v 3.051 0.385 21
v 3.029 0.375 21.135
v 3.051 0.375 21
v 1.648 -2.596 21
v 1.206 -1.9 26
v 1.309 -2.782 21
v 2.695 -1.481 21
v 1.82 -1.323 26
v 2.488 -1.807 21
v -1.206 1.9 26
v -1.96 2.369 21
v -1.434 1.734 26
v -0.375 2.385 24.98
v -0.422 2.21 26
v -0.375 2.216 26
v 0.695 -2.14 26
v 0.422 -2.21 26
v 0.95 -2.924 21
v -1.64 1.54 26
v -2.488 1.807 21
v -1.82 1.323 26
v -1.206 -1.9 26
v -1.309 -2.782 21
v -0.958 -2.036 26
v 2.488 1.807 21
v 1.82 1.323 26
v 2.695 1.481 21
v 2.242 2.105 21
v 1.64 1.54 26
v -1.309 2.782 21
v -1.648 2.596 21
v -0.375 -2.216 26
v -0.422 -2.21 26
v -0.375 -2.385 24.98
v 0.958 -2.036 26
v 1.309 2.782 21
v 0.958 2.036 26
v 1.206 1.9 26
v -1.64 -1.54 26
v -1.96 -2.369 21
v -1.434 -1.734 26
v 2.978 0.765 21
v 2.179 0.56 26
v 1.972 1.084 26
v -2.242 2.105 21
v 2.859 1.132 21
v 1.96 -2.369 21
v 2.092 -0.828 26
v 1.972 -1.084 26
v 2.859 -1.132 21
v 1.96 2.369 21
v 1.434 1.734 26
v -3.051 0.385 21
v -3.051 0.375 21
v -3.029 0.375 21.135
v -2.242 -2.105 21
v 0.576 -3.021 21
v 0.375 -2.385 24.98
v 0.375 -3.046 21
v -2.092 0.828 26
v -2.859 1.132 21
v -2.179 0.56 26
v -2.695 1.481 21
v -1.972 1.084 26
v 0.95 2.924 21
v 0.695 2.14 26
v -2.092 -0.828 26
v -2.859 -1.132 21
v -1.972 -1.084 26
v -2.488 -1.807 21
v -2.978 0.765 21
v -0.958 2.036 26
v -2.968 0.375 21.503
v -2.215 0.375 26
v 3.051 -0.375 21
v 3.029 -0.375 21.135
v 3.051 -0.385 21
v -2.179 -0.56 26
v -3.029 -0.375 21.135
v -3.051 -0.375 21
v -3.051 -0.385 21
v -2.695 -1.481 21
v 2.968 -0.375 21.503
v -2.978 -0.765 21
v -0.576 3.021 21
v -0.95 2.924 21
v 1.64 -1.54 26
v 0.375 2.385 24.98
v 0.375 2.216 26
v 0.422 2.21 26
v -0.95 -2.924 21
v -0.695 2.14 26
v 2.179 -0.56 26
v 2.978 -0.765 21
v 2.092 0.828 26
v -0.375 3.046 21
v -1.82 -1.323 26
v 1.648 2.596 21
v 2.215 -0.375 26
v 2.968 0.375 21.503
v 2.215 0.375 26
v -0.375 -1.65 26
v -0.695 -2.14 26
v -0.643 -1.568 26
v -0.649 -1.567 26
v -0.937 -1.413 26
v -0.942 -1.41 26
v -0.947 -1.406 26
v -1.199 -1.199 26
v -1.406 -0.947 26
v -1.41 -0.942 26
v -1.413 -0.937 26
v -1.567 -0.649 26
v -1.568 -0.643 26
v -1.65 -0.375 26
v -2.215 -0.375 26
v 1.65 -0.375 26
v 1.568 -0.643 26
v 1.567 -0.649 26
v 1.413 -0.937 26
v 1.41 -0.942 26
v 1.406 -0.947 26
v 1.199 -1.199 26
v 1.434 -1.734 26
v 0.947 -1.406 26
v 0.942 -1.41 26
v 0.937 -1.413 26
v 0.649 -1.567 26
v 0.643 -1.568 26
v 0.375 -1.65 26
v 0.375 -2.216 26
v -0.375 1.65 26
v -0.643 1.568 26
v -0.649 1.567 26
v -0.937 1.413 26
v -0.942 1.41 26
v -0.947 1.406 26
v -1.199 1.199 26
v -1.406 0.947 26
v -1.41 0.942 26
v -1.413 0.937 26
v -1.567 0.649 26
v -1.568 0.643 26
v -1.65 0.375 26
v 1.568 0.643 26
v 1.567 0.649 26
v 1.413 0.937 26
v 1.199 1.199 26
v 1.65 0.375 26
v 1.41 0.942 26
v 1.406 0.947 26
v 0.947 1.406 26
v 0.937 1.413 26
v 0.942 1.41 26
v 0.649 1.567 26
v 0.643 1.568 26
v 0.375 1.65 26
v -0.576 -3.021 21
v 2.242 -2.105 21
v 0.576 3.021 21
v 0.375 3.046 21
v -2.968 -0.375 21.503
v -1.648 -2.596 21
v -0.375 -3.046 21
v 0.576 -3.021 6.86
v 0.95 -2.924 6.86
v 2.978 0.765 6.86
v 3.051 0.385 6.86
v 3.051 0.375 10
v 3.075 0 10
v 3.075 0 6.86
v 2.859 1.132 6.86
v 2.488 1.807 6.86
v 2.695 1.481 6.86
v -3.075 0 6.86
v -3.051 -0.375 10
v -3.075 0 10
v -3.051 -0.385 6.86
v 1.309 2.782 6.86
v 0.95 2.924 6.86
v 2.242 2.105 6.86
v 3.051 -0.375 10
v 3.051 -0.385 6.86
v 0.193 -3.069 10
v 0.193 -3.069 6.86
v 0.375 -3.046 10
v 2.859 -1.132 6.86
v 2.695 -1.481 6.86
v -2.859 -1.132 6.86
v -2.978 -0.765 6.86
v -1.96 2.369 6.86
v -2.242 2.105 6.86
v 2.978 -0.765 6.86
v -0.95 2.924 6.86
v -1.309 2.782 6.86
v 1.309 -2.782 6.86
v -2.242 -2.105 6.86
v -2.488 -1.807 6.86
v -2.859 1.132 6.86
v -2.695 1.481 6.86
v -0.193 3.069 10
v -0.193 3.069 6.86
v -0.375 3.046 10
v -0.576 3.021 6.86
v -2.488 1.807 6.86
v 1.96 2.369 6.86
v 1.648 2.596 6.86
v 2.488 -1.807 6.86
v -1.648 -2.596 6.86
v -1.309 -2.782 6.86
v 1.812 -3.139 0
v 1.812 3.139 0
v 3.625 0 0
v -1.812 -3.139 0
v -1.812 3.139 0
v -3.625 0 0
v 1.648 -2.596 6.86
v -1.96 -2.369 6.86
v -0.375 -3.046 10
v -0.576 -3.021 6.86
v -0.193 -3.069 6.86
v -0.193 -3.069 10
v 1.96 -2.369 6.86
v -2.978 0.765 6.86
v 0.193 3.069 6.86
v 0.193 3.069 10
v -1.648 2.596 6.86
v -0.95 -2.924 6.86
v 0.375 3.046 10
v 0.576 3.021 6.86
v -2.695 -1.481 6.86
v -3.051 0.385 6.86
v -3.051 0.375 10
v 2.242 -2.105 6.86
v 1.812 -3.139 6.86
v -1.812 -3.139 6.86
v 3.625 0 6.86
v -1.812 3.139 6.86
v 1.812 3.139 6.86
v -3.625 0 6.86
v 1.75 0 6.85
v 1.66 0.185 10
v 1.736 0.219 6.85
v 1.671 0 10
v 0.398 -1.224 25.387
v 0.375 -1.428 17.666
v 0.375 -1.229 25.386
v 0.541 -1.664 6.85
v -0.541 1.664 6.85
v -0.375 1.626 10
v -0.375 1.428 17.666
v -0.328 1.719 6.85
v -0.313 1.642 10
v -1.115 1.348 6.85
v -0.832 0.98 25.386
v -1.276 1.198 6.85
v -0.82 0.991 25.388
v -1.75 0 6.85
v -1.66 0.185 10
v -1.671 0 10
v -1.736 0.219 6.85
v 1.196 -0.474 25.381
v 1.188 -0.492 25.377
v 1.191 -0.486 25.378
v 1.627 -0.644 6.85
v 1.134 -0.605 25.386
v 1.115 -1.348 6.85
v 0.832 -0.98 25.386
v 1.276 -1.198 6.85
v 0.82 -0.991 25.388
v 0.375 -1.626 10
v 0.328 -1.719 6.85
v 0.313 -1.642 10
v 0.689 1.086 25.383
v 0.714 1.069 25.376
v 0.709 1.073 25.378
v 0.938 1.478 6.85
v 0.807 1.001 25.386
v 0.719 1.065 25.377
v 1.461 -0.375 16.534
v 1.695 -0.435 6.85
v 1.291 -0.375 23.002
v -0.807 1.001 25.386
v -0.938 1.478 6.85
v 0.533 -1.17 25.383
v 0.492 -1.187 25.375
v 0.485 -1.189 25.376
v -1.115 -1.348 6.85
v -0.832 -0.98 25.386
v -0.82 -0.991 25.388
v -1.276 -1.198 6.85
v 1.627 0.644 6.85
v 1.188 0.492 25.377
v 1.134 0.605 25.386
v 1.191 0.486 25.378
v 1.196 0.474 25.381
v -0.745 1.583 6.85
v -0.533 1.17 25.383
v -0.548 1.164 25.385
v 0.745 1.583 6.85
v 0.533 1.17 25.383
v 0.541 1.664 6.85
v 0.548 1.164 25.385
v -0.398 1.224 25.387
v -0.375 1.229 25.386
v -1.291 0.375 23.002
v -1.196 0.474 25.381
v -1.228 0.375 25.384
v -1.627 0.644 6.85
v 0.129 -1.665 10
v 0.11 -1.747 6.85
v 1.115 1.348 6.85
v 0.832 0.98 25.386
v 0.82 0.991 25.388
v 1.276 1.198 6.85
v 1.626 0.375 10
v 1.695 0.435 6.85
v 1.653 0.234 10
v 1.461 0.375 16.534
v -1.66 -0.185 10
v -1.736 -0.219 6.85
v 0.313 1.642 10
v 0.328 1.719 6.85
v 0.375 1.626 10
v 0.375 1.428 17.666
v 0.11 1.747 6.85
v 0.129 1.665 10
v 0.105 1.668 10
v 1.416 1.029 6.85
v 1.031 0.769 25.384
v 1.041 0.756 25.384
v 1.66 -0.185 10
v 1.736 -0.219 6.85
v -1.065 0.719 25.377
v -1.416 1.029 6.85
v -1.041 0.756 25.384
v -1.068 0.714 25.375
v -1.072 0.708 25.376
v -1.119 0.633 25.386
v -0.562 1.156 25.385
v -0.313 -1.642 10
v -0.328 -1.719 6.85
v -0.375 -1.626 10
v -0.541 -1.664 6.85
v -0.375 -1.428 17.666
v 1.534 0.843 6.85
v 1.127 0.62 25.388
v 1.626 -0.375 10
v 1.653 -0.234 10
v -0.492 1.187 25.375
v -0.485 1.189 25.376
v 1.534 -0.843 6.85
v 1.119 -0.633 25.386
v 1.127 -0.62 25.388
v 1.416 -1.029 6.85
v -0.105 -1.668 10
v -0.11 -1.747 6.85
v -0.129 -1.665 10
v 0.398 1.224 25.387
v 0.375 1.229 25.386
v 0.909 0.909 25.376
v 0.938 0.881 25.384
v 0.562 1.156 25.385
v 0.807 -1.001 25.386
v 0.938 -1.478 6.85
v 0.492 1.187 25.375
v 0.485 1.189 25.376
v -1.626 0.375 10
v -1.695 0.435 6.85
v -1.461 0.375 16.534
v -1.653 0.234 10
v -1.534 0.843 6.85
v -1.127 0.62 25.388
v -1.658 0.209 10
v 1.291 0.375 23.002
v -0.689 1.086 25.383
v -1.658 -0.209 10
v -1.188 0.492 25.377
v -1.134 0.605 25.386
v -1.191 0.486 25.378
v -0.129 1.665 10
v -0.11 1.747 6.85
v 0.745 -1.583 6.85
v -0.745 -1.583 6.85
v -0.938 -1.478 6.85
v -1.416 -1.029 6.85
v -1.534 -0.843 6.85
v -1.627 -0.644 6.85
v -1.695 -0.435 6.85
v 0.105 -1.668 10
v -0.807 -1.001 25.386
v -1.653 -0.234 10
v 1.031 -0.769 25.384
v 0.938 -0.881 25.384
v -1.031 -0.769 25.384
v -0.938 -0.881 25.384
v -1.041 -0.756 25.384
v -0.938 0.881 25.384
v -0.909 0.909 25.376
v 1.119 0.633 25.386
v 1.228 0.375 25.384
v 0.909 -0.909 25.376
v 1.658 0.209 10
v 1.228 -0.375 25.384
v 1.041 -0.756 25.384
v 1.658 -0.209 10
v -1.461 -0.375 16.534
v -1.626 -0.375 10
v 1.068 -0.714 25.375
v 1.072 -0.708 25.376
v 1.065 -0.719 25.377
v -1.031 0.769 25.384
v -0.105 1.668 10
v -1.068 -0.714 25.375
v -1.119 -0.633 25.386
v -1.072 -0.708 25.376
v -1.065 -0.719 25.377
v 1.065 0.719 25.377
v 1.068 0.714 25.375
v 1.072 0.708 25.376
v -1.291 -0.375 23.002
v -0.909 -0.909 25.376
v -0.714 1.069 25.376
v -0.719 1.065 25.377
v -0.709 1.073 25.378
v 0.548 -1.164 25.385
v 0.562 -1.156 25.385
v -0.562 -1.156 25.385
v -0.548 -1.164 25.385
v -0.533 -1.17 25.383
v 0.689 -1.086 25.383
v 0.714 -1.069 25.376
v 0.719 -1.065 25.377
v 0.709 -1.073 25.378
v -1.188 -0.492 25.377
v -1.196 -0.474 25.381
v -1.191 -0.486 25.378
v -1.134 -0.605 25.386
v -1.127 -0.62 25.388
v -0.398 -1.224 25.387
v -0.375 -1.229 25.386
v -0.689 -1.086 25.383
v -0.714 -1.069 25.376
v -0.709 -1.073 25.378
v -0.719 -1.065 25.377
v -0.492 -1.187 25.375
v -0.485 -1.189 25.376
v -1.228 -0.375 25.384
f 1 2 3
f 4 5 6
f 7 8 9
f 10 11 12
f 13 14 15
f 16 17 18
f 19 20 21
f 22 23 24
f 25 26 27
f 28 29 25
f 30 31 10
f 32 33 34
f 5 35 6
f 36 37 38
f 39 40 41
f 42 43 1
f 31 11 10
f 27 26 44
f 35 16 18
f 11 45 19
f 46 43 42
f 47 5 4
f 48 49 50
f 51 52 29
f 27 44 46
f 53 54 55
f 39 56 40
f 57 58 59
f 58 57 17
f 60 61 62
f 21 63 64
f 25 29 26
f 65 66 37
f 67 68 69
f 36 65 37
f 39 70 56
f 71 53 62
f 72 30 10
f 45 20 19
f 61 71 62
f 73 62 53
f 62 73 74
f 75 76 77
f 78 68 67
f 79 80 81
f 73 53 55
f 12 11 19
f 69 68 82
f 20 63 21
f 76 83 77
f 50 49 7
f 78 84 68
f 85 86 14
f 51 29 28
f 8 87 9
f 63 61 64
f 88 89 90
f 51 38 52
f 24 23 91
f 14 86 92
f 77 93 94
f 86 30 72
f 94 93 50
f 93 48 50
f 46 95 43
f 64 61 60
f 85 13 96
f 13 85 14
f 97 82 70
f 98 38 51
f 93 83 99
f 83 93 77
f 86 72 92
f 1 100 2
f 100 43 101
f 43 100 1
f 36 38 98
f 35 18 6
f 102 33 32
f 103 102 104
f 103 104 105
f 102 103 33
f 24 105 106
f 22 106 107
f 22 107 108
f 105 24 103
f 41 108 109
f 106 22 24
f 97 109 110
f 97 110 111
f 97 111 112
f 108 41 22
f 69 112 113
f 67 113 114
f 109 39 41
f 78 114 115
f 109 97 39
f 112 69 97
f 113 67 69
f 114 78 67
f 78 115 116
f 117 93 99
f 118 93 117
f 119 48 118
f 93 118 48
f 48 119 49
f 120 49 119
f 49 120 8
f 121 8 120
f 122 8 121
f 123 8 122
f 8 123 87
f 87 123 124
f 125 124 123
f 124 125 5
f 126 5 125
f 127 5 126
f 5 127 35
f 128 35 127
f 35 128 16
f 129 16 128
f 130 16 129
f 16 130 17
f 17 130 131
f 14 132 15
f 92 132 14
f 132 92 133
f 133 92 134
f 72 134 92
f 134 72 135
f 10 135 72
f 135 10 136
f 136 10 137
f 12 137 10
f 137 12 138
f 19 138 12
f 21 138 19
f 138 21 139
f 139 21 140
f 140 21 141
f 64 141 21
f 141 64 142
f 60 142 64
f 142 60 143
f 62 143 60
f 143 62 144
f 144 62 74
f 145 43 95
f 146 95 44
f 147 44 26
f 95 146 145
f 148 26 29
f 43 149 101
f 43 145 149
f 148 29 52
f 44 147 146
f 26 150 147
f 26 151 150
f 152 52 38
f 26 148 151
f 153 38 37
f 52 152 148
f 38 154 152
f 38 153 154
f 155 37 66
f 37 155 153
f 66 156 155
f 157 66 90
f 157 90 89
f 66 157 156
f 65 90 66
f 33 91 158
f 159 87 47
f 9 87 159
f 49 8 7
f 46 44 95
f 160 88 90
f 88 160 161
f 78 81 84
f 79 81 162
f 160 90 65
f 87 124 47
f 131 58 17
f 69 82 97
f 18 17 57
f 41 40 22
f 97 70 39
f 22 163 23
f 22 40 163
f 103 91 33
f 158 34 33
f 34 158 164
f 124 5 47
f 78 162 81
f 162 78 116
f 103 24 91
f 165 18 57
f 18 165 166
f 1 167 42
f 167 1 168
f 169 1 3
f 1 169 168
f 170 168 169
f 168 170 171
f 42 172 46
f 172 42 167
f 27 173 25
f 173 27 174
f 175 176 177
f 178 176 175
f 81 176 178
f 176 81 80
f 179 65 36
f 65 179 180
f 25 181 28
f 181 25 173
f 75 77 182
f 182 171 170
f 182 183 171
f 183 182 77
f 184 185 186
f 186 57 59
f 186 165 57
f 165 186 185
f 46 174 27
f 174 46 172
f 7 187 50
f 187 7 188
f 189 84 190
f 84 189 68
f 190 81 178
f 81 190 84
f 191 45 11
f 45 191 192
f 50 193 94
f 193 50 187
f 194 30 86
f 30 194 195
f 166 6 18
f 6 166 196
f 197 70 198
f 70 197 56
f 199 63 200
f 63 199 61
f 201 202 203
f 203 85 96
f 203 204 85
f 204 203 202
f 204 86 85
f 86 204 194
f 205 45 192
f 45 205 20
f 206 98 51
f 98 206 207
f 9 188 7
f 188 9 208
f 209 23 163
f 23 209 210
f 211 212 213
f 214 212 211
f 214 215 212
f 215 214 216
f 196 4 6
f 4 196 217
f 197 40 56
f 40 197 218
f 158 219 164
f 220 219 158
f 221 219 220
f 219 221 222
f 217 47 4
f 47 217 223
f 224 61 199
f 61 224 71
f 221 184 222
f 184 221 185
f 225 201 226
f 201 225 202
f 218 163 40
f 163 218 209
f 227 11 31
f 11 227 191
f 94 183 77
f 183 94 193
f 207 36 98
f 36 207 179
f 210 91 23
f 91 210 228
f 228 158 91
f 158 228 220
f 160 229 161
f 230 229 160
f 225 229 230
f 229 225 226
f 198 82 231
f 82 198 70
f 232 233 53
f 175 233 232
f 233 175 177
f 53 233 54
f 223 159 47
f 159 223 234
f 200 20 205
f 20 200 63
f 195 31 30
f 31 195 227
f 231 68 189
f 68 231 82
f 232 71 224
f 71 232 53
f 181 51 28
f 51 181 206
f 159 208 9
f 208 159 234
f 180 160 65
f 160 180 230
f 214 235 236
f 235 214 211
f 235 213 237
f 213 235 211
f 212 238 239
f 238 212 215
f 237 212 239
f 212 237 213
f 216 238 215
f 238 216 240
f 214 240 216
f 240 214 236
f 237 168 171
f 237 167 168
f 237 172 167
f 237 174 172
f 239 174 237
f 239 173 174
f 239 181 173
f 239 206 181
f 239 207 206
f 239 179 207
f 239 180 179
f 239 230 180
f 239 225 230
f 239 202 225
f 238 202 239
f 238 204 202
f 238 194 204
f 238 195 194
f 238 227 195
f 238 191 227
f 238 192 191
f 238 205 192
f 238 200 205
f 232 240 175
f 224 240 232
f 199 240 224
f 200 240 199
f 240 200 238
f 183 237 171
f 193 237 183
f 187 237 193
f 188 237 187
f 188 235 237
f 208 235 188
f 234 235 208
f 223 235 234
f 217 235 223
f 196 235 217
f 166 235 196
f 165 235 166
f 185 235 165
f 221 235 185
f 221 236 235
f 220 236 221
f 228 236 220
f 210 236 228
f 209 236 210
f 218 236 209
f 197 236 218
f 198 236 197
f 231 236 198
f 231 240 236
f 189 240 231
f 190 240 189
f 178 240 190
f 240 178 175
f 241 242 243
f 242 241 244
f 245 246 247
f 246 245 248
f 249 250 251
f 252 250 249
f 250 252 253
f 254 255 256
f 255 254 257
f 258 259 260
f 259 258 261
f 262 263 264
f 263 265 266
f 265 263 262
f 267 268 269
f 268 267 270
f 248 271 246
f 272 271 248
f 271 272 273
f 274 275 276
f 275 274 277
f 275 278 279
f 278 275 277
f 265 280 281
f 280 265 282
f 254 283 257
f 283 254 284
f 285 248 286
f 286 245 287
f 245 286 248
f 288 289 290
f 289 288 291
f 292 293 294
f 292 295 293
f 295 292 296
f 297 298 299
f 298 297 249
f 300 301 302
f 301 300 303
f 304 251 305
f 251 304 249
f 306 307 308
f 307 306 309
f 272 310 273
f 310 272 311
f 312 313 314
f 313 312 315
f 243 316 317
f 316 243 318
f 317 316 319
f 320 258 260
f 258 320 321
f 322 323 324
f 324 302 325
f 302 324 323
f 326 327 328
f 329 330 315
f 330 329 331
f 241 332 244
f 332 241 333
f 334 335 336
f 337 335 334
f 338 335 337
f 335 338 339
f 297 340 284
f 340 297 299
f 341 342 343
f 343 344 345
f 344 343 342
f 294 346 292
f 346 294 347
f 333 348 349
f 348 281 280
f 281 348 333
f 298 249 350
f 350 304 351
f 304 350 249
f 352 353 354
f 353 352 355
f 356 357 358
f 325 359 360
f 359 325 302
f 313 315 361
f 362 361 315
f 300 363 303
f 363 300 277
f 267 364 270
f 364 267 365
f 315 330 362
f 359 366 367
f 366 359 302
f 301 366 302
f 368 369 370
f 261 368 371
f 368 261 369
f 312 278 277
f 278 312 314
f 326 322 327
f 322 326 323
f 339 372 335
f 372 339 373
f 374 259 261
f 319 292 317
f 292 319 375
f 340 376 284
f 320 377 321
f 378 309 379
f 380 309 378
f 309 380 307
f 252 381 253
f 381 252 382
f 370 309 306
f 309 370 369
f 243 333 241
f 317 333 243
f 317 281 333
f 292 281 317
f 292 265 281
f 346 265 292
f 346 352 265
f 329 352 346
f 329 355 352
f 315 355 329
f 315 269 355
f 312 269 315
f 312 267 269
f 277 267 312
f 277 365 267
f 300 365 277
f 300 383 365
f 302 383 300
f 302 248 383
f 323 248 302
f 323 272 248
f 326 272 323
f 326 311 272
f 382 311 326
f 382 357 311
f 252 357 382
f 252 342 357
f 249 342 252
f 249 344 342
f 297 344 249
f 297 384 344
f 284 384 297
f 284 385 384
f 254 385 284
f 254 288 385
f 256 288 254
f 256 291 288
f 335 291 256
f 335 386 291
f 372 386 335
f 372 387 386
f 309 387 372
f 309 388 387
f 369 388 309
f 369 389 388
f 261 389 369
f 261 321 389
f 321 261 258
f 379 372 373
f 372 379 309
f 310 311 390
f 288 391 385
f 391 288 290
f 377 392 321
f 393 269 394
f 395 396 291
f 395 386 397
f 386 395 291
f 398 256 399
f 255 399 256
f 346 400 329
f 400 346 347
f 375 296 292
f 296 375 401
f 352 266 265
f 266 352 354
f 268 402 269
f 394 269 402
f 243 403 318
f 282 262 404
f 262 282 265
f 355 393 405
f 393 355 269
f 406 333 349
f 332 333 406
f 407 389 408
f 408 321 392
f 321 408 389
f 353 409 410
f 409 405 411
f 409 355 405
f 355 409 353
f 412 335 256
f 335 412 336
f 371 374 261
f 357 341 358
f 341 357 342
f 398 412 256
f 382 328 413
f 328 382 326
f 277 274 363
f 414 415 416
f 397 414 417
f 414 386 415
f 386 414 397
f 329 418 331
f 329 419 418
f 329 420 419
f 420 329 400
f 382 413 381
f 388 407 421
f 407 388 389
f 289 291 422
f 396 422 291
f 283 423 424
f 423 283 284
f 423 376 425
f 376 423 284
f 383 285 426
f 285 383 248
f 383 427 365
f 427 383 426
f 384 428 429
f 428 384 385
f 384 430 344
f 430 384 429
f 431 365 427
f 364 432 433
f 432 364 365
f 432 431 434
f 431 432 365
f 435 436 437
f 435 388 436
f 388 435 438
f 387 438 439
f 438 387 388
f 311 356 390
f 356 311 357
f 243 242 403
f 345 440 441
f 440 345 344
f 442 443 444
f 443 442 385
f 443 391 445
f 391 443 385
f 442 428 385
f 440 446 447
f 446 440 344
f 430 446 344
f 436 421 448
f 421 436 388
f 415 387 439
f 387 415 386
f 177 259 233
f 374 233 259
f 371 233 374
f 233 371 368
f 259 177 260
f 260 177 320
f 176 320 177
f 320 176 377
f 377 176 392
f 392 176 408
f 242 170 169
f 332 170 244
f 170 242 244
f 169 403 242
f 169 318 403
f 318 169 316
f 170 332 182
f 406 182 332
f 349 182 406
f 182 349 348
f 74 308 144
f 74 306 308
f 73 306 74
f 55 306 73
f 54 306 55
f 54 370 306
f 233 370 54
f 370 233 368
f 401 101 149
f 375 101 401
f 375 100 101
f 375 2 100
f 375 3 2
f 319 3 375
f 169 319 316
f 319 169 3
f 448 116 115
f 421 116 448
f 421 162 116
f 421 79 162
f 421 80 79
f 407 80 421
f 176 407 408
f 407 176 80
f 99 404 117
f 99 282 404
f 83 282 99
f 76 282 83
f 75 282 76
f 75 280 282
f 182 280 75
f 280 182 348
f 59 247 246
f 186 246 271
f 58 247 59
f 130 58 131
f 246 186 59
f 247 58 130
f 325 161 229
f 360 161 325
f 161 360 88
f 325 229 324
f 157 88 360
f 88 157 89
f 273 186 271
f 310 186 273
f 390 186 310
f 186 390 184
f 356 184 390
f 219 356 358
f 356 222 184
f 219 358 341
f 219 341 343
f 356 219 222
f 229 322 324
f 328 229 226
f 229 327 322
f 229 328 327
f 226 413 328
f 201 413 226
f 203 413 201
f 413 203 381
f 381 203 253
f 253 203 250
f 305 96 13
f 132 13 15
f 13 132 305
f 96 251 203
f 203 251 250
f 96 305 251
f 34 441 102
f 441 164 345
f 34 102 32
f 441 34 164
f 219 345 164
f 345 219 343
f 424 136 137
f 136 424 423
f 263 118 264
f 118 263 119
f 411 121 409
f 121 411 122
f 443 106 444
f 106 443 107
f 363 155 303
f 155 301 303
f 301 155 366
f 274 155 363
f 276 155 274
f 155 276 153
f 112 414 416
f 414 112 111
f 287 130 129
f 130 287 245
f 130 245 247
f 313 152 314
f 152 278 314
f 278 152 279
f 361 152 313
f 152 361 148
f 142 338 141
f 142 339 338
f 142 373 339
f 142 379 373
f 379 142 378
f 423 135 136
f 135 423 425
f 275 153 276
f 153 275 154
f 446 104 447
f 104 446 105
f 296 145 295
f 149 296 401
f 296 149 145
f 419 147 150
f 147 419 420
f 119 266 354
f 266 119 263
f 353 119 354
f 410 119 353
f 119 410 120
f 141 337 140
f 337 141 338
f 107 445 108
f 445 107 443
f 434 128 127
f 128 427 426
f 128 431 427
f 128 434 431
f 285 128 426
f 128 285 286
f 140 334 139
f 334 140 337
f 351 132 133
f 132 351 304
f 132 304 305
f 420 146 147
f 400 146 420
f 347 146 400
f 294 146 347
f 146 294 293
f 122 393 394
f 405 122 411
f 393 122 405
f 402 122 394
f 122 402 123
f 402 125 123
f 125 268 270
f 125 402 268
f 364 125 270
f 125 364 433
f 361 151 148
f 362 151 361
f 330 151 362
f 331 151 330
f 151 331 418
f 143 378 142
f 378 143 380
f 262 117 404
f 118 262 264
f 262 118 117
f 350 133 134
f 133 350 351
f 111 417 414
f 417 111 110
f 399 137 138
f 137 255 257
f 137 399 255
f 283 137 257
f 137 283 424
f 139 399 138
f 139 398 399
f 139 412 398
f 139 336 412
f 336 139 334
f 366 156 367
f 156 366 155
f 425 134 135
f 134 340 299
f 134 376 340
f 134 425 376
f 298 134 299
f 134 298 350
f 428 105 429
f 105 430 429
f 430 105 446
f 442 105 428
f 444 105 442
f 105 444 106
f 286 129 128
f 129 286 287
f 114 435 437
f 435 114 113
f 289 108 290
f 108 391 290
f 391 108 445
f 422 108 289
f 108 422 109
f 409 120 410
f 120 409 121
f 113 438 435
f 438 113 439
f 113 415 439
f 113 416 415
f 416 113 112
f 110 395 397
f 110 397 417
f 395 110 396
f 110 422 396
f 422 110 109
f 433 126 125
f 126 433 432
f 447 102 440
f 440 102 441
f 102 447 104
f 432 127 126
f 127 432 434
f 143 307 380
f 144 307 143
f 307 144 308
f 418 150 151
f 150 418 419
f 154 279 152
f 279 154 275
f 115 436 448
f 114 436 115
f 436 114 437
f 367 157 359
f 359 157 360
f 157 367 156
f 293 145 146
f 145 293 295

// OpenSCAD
id=2.5;
gap=0.75;

difference() {
  union() {
    translate([0,0,21]) cylinder(h=5, d1=6.15, d2=id+2, $fn=50);
    cylinder(d=6.15, h=21, $fn=50);
    cylinder(d=7.25, h=6.86, $fn=6);
  }
  
  translate([0,0,6.85]) cylinder(d1=id+1, d2=id, h=20, $fn=50);
  
  translate([-5,-gap/2,10]) cube([10,gap,17]);
  translate([-gap/2,-5,10]) cube([gap,10,17]);
  
  translate([0,0,23.5]) cylinder(d1=0.1, d2=8, h=6, $fn=32);
}
